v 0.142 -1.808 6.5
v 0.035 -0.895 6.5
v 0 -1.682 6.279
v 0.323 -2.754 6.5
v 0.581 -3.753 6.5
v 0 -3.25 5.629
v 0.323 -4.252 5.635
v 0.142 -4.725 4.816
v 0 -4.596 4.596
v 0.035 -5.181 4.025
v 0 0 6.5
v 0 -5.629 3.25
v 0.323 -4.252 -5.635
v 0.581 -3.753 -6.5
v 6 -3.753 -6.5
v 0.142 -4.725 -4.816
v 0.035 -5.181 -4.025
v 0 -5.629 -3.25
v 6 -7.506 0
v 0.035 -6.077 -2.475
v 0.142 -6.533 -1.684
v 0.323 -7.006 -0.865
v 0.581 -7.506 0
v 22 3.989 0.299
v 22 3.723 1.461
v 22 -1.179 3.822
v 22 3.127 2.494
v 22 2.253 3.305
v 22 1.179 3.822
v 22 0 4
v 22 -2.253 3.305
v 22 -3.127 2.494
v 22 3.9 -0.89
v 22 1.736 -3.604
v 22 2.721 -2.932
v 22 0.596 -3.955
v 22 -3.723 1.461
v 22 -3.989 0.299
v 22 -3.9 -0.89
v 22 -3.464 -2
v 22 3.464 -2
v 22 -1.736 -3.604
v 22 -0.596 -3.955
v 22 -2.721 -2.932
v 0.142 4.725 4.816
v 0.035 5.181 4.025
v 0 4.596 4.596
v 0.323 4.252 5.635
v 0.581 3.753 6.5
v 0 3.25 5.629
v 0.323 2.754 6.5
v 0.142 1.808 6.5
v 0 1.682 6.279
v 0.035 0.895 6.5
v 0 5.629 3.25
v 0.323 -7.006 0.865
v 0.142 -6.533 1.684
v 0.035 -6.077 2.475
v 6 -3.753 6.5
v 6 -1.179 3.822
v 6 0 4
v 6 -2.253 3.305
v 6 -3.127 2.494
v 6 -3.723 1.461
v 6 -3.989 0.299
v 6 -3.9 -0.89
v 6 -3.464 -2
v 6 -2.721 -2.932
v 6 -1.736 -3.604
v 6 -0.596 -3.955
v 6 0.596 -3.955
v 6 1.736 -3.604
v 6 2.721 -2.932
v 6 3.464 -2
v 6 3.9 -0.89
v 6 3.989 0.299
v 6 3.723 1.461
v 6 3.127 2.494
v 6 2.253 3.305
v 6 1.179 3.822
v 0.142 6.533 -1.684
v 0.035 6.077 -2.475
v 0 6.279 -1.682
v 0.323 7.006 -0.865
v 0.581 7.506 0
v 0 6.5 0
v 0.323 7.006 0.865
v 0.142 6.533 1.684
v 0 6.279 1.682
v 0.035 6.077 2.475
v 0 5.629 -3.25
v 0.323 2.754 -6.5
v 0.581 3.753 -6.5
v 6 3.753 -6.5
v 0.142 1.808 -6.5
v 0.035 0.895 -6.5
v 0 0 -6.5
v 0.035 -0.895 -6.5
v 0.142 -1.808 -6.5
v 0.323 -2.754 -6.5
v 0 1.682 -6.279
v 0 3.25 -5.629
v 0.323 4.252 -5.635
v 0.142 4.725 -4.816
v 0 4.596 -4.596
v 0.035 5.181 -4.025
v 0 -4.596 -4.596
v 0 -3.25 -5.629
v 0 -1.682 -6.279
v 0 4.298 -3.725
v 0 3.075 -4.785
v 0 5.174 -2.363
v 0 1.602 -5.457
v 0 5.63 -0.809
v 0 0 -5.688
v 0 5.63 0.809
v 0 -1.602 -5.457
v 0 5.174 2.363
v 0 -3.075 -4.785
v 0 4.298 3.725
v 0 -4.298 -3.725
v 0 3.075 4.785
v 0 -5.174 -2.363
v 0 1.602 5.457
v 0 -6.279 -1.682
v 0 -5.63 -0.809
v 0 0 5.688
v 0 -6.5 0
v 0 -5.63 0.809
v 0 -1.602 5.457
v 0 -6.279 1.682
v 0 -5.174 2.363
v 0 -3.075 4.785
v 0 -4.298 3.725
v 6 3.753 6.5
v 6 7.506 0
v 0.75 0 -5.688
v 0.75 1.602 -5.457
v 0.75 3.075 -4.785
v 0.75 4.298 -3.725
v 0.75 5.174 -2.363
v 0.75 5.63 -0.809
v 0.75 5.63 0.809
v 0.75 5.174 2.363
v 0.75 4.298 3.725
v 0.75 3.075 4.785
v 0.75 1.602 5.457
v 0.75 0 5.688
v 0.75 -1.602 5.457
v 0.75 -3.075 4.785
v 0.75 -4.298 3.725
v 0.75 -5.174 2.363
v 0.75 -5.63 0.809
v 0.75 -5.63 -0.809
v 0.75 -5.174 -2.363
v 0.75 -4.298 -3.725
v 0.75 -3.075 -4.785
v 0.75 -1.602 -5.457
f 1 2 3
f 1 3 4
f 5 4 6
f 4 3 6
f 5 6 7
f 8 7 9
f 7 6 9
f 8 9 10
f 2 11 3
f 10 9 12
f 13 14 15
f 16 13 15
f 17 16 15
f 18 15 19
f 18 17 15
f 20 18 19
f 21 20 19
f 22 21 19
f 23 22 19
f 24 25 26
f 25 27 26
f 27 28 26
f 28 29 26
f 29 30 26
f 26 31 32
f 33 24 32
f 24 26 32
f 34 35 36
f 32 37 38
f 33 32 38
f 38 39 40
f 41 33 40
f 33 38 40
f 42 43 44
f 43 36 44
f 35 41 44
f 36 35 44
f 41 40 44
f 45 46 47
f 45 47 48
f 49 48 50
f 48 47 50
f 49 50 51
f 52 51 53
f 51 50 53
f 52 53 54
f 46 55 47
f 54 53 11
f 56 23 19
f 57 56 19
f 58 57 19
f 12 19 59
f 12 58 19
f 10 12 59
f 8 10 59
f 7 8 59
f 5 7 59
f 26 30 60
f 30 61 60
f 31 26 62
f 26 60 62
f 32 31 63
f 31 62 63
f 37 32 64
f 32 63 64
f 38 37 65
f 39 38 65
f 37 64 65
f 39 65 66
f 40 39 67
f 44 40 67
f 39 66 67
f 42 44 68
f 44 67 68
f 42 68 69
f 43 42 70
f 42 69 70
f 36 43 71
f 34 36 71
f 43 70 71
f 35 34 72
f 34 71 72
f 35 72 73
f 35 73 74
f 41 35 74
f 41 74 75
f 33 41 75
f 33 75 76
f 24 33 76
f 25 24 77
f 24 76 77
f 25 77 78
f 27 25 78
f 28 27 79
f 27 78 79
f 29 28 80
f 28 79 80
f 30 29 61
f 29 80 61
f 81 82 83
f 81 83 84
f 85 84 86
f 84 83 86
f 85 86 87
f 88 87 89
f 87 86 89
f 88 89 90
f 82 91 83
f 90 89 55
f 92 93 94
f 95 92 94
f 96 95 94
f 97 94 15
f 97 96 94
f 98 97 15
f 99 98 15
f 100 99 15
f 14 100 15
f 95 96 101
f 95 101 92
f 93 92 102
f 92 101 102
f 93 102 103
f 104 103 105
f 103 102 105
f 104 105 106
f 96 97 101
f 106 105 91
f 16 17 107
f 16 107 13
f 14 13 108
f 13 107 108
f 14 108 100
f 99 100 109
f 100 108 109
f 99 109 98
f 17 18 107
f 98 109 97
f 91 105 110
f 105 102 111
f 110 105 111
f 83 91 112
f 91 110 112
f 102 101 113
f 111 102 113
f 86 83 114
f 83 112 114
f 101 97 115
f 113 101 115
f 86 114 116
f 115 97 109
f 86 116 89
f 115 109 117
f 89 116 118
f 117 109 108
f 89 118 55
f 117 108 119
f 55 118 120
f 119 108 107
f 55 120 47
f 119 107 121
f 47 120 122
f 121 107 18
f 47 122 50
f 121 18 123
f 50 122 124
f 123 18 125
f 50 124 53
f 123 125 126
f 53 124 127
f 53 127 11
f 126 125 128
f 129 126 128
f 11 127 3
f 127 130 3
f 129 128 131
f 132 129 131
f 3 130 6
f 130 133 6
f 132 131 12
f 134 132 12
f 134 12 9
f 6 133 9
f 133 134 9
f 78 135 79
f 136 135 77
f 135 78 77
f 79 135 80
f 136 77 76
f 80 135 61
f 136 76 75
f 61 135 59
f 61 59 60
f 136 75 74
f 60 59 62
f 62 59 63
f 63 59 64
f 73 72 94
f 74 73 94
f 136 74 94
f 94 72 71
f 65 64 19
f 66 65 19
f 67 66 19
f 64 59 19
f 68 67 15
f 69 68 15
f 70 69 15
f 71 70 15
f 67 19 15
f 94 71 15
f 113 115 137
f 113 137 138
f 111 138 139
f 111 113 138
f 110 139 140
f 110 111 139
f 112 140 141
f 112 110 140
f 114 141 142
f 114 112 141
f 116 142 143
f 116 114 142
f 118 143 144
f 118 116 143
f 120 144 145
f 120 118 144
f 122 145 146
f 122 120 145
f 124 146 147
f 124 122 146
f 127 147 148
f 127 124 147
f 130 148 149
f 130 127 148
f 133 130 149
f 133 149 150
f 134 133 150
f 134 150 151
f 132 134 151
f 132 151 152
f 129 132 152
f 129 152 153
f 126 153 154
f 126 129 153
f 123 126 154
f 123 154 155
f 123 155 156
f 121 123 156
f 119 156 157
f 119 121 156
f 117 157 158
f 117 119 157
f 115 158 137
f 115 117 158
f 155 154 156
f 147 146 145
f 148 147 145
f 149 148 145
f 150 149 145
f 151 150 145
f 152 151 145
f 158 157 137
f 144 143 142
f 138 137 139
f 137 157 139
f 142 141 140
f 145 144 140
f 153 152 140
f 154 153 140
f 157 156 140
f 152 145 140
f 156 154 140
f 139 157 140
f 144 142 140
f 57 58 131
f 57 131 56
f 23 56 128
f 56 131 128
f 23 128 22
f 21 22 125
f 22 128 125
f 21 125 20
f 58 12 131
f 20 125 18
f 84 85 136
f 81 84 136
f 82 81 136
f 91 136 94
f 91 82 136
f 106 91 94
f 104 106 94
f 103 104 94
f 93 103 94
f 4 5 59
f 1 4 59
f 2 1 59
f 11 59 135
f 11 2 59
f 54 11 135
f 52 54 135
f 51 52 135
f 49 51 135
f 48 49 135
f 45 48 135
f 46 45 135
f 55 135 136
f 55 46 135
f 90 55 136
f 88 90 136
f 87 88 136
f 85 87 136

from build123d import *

# Parameters (mm, degrees)
HEX_DIE_START = -1e-06
SKETCH2_R     = 7.580831409
HEX_DIE_DEPTH = 6.000001
SKETCH4_R     = 5.6875
INDENT_DEPTH  = 0.75


with BuildPart() as part:
    # BodySke → Base-Revolve (revolve)
    with BuildSketch(Plane.XY, mode=Mode.PRIVATE) as base_revolve_sk:
        Polygon((6, 4), (6, 7.505773672), (0.5806837, 7.505773672), (0, 6.5), (0, 0), (22, 0), (22, 4), align=None)
    revolve(base_revolve_sk.sketch.rotate(Axis((-25.4, 0, 0), (1, 0, 0)), 90), axis=Axis((-25.4, 0, 0), (1, 0, 0)))

    # Sketch2 → Hex-Die (cut)
    with BuildSketch(Plane(origin=(0, 0, 0), x_dir=(0, 0, -1), z_dir=(1, 0, 0)).offset(HEX_DIE_START)):
        Circle(SKETCH2_R)
        Polygon((-6.5, 3.752776766), (0, 7.505553532), (6.5, 3.752776766), (6.5, -3.752776766), (0, -7.505553532), (-6.5, -3.752776766), align=None, mode=Mode.SUBTRACT)
    extrude(amount=HEX_DIE_DEPTH, mode=Mode.SUBTRACT)

    # Sketch4 → Indent (cut)
    with BuildSketch(Plane(origin=(0, 0, 0), x_dir=(0, 0, -1), z_dir=(1, 0, 0))):
        Circle(SKETCH4_R)
    extrude(amount=INDENT_DEPTH, mode=Mode.SUBTRACT)


solid = part.part
